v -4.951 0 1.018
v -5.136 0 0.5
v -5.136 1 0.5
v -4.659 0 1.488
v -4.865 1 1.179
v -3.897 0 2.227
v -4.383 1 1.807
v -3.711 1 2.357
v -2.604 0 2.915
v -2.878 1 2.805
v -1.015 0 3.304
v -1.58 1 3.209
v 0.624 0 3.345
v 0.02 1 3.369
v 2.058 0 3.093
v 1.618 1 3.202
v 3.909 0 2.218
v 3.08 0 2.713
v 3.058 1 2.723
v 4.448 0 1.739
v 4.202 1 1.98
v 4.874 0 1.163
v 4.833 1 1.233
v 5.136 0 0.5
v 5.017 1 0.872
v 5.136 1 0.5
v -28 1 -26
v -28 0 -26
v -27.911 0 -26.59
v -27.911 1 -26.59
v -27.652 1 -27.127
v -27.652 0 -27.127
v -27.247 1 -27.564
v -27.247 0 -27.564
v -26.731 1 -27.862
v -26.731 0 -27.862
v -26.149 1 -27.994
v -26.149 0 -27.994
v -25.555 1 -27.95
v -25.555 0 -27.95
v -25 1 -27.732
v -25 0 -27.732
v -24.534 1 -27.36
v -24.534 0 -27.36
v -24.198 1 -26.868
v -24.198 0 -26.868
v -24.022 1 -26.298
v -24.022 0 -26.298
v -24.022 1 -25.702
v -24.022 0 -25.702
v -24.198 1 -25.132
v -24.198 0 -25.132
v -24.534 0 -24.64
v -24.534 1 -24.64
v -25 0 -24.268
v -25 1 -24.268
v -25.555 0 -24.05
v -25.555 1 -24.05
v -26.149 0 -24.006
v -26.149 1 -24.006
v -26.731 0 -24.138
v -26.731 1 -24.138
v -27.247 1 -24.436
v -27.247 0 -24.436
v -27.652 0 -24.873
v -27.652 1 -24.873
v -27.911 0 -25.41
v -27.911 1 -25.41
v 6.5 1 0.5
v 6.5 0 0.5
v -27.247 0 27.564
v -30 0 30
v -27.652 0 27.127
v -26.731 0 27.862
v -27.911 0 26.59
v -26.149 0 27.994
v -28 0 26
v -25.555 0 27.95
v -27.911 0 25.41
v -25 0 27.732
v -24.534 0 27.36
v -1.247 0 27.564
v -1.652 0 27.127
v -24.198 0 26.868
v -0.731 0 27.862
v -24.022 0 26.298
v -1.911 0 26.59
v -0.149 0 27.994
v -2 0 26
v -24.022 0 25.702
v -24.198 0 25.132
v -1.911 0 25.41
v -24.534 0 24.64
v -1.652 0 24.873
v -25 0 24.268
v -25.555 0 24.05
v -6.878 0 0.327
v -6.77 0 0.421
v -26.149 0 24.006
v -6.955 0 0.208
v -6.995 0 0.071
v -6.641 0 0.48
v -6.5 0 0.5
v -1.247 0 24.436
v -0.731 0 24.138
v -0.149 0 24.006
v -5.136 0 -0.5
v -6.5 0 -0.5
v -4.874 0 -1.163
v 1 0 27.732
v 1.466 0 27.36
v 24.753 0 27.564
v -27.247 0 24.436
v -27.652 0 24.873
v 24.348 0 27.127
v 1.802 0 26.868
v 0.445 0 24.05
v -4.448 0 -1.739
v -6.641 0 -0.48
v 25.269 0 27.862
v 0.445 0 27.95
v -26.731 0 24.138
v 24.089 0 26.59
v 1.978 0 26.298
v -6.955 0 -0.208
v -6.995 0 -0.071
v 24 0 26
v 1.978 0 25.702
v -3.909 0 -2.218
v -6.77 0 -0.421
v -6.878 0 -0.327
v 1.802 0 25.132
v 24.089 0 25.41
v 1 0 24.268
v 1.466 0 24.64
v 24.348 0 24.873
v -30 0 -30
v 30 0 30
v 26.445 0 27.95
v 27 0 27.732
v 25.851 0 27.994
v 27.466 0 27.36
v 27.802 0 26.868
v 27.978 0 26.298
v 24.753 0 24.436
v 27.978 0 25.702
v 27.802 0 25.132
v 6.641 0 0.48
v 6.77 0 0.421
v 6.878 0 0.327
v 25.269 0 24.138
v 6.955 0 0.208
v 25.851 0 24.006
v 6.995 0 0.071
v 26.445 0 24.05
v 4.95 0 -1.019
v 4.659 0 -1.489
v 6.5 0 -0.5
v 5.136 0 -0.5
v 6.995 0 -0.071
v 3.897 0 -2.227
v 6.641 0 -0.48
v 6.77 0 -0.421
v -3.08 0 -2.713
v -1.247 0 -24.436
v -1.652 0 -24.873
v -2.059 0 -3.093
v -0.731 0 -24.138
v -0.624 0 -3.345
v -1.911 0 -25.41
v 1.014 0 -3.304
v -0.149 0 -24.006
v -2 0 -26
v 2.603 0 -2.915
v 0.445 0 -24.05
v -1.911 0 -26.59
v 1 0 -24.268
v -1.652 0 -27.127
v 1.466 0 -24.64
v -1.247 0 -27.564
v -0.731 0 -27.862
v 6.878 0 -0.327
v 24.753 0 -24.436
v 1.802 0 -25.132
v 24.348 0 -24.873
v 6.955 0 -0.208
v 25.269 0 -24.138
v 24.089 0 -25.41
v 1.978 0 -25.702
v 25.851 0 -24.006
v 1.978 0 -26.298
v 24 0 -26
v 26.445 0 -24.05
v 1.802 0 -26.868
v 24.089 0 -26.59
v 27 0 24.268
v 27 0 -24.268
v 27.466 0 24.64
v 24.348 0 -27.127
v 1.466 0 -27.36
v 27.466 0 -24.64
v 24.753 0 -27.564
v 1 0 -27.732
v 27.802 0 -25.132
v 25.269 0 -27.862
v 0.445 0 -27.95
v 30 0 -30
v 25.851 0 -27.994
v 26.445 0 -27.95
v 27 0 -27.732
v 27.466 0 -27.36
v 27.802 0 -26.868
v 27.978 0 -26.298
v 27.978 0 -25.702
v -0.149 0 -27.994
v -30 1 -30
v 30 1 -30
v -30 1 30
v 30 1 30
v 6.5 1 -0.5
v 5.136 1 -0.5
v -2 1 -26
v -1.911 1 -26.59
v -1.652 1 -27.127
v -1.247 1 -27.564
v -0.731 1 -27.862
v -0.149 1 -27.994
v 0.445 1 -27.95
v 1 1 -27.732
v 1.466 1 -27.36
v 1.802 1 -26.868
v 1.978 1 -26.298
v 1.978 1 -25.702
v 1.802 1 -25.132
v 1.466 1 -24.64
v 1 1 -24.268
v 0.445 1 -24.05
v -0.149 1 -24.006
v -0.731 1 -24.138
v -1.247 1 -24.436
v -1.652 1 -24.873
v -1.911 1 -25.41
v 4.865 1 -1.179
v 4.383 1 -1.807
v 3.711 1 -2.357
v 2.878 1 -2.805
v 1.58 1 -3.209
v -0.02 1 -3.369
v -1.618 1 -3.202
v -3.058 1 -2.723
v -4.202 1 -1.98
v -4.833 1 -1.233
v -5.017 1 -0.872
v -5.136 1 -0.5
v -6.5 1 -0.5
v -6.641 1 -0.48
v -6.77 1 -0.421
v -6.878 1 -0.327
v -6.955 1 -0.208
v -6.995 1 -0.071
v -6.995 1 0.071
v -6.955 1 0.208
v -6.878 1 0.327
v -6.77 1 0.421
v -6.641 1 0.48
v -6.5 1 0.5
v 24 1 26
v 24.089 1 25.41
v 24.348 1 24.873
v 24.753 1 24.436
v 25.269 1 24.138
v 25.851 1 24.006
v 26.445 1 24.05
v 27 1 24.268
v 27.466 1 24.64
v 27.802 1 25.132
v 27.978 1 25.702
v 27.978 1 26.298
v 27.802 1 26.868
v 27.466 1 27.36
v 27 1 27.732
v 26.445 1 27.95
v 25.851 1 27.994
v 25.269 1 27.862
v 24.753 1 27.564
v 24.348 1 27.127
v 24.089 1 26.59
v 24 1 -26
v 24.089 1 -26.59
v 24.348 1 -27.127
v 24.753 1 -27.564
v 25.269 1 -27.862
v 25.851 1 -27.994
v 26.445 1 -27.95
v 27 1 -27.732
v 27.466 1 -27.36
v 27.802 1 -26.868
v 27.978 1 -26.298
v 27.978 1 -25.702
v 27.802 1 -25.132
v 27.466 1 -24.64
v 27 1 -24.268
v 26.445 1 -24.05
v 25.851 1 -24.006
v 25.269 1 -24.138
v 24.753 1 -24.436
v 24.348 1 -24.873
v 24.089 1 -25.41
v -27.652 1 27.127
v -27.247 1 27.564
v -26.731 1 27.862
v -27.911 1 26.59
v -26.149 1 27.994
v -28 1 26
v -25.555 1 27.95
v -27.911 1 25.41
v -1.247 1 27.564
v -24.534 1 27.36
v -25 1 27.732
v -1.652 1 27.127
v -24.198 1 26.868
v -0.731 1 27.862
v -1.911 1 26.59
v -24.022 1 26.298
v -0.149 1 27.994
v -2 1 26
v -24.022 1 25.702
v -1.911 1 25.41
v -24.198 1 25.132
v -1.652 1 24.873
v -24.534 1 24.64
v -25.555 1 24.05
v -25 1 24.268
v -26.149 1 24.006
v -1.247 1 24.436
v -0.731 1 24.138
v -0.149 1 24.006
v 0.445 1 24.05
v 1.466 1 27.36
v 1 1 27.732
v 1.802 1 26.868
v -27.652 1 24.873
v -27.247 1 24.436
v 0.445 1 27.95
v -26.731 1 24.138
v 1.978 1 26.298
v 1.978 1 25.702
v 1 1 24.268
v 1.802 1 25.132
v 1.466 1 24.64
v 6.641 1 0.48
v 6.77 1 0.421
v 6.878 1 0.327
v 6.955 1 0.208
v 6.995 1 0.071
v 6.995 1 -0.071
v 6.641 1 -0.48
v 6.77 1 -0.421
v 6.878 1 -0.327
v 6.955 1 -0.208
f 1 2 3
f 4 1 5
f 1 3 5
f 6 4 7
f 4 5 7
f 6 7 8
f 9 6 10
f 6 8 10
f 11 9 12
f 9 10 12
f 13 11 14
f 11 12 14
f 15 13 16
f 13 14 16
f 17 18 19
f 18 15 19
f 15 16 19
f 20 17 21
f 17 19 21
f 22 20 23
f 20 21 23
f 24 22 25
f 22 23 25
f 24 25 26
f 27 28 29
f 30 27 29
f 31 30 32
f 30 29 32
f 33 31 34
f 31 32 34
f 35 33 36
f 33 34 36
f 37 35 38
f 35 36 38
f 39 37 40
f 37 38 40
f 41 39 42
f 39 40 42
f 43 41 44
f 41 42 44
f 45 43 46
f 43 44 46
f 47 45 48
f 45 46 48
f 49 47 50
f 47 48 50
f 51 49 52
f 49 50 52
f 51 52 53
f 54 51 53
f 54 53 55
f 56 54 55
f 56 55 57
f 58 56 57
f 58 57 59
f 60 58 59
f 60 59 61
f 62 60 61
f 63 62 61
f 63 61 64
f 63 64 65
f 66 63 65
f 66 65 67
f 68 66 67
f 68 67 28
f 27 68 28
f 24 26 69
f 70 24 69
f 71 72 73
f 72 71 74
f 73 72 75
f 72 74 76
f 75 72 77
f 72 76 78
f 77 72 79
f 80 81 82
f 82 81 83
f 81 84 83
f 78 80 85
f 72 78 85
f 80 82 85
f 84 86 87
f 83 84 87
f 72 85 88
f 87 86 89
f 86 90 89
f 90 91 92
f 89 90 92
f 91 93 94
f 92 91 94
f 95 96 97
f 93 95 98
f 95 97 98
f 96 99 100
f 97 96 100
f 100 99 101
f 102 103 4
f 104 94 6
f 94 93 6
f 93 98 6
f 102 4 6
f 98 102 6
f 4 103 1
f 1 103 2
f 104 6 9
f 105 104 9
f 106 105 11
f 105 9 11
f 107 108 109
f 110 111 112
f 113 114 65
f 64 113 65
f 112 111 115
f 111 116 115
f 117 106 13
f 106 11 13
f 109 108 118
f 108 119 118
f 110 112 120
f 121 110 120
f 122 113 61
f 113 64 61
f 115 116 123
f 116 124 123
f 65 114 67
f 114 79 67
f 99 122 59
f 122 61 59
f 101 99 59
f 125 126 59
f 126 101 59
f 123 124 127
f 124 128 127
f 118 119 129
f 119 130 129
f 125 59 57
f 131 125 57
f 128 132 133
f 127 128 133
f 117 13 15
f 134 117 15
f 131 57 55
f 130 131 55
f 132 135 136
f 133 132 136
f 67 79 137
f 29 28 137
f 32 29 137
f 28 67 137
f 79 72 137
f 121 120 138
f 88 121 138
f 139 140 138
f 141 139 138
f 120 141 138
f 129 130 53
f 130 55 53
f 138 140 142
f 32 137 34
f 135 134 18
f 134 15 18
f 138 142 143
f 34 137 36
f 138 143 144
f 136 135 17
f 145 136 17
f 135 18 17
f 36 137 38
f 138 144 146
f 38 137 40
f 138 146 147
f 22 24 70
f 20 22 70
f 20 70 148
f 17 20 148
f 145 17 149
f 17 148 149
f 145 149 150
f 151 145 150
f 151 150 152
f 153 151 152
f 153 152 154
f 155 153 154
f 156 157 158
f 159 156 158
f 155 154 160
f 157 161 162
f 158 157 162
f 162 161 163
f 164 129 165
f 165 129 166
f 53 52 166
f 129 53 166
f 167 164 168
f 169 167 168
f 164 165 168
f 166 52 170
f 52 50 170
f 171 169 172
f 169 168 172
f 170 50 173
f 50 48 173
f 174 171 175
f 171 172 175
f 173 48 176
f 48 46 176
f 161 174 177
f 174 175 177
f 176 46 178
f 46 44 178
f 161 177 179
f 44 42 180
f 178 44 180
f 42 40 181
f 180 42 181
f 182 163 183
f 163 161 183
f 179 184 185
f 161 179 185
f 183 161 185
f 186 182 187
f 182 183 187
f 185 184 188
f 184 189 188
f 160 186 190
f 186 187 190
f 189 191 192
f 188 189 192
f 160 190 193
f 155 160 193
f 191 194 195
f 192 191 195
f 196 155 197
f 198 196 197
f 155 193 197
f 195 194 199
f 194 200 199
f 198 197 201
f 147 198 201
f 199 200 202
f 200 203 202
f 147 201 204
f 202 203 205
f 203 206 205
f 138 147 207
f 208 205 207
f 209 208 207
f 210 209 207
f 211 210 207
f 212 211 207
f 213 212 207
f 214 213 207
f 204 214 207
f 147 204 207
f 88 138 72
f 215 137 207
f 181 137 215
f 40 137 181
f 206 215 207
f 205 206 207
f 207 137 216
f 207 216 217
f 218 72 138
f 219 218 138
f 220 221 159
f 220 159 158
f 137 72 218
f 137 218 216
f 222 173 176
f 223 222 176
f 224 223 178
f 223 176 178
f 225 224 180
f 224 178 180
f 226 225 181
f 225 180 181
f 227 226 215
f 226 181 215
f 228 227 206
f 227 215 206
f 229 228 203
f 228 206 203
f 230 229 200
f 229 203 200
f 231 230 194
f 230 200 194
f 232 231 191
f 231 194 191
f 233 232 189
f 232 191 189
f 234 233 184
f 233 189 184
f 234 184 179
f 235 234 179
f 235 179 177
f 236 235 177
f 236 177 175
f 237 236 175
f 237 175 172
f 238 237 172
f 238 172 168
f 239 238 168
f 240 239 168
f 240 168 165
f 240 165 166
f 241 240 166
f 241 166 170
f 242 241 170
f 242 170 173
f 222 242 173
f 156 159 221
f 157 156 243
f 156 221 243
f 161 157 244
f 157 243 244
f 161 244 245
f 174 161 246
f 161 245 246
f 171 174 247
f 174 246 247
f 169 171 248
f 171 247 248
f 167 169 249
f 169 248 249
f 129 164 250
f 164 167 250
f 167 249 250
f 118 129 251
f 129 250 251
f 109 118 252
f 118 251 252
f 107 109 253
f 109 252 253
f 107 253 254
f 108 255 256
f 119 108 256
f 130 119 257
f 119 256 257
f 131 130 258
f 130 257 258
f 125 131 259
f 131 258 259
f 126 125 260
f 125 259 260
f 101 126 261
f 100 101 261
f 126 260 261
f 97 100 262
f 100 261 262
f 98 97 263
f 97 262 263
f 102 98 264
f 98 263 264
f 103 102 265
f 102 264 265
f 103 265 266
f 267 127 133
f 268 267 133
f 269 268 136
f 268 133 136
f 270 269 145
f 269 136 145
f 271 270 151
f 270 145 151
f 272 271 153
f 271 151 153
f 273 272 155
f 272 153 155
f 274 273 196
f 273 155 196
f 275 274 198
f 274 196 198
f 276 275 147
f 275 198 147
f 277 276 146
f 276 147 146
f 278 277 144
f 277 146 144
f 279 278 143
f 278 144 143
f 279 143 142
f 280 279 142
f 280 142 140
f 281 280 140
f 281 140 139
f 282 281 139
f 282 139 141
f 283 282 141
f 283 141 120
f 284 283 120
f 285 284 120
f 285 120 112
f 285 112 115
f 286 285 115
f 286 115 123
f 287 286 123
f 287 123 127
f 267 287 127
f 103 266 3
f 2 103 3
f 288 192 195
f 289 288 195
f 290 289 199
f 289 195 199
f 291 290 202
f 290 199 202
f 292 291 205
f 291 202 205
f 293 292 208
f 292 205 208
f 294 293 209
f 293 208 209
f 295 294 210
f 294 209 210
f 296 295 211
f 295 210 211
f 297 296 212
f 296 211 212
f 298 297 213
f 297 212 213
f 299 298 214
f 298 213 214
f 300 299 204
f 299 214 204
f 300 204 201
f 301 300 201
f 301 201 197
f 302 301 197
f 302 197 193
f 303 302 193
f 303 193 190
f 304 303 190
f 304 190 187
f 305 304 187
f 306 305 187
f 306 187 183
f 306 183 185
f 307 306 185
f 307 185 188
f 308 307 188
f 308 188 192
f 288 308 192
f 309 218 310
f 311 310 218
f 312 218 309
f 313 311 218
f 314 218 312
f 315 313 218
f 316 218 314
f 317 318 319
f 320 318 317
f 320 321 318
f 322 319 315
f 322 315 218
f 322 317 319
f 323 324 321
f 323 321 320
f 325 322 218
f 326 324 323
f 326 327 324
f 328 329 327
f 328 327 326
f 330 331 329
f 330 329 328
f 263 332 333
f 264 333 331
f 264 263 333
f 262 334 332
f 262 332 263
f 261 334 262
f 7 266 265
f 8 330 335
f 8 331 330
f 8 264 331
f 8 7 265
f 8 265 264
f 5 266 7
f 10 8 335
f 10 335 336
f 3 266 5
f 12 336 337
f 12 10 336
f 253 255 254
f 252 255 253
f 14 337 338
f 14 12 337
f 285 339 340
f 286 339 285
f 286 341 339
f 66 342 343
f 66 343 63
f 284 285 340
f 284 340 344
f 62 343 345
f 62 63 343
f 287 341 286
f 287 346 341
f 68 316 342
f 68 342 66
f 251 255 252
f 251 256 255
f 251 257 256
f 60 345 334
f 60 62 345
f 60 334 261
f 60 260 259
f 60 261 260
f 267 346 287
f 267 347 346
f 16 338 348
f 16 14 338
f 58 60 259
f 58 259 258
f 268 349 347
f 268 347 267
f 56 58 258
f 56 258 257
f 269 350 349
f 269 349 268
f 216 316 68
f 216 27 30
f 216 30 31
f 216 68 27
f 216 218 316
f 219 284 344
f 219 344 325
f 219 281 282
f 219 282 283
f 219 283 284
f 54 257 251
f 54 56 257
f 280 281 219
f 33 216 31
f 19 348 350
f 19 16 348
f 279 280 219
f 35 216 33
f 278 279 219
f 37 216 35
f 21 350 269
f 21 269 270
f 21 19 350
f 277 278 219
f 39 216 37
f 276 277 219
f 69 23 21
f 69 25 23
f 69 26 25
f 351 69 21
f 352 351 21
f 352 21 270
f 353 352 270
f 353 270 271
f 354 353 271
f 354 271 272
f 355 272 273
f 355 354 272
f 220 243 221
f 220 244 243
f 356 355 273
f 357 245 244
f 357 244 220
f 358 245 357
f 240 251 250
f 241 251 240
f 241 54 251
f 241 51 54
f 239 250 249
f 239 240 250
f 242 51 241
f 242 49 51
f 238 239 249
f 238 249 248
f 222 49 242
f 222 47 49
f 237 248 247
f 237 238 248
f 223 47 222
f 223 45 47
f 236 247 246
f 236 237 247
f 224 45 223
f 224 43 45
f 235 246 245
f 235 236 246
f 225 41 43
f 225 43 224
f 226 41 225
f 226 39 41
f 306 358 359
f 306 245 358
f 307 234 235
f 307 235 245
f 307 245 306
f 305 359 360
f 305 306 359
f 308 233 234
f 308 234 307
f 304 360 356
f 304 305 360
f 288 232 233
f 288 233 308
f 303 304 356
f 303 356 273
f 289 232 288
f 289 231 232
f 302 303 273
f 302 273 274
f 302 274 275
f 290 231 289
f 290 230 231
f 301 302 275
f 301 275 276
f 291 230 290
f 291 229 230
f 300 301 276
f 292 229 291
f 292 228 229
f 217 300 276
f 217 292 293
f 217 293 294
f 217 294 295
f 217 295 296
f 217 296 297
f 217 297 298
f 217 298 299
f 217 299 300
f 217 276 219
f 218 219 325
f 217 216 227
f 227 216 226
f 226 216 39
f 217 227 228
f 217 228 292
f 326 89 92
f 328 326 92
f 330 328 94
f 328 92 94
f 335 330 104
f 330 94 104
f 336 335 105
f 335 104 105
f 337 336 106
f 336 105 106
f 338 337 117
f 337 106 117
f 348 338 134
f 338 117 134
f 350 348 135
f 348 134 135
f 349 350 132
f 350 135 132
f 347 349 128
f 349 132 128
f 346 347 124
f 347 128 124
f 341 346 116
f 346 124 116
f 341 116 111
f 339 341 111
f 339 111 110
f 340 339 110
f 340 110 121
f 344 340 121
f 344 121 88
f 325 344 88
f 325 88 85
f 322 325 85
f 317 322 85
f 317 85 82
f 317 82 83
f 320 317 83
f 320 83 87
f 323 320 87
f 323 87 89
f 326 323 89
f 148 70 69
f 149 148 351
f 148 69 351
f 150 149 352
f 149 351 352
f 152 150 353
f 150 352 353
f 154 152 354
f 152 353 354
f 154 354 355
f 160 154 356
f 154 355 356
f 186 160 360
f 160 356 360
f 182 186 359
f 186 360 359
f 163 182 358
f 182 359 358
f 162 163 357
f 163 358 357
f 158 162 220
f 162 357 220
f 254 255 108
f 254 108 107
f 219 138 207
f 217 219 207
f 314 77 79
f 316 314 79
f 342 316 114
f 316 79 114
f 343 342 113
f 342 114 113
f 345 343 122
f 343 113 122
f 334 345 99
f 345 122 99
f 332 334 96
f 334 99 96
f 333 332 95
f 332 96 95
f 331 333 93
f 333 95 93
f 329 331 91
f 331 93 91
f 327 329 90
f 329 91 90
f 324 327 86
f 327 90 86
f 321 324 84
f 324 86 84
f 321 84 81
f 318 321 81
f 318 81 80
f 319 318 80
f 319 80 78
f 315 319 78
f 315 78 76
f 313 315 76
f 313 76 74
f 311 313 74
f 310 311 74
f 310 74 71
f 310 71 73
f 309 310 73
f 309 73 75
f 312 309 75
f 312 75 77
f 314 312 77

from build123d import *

# Parameters (mm, degrees)
SKETCH1_W                    = 60
SKETCH1_H                    = 60
BOSS_EXTRUDE1_DEPTH          = 1
F_4_0_4_DIAMETER_HOLE1_D     = 4
F_4_0_4_DIAMETER_HOLE1_DEPTH = 1
SKETCH3_R                    = 0.5
CUT_EXTRUDE1_DEPTH           = 5
SKETCH9_W                    = 13
SKETCH9_H                    = 1
CUT_EXTRUDE7_DEPTH           = 5
SKETCH10_RX                  = 5.193553557
SKETCH10_RY                  = 3.369235694
CUT_EXTRUDE8_DEPTH           = 5


with BuildPart() as part:
    # Sketch1 → Boss-Extrude1 (new body)
    with BuildSketch(Plane(origin=(0, 0, 0), x_dir=(1, 0, 0), z_dir=(0, 1, 0))):
        Rectangle(SKETCH1_W, SKETCH1_H)
    extrude(amount=BOSS_EXTRUDE1_DEPTH)

    # Ø4.0 (4) Diameter Hole1
    with Locations(Plane(origin=(0, 1, 0), x_dir=(1, 0, 0), z_dir=(0, 1, 0))):
        with Locations((26, 26), (0, 26), (-26, 26), (0, -26), (26, -26), (-26, -26)):
            Hole(F_4_0_4_DIAMETER_HOLE1_D / 2, depth=F_4_0_4_DIAMETER_HOLE1_DEPTH)

    # Sketch3 → Cut-Extrude1 (cut)
    with BuildSketch(Plane(origin=(0, 1, 0), x_dir=(1, 0, 0), z_dir=(0, 1, 0))):
        with Locations((6.5, 0)):
            Circle(SKETCH3_R)
        with Locations((-6.5, 0)):
            Circle(SKETCH3_R)
    extrude(amount=-CUT_EXTRUDE1_DEPTH, mode=Mode.SUBTRACT)

    # Sketch9 → Cut-Extrude7 (cut)
    with BuildSketch(Plane(origin=(0, 1, 0), x_dir=(1, 0, 0), z_dir=(0, 1, 0))):
        Rectangle(SKETCH9_W, SKETCH9_H)
    extrude(amount=-CUT_EXTRUDE7_DEPTH, mode=Mode.SUBTRACT)

    # Sketch10 → Cut-Extrude8 (cut)
    with BuildSketch(Plane(origin=(0, 1, 0), x_dir=(1, 0, 0), z_dir=(0, 1, 0))):
        with Locations(Location((0, 0), (0, 0, 180))):
            Ellipse(SKETCH10_RX, SKETCH10_RY)
    extrude(amount=-CUT_EXTRUDE8_DEPTH, mode=Mode.SUBTRACT)


solid = part.part
